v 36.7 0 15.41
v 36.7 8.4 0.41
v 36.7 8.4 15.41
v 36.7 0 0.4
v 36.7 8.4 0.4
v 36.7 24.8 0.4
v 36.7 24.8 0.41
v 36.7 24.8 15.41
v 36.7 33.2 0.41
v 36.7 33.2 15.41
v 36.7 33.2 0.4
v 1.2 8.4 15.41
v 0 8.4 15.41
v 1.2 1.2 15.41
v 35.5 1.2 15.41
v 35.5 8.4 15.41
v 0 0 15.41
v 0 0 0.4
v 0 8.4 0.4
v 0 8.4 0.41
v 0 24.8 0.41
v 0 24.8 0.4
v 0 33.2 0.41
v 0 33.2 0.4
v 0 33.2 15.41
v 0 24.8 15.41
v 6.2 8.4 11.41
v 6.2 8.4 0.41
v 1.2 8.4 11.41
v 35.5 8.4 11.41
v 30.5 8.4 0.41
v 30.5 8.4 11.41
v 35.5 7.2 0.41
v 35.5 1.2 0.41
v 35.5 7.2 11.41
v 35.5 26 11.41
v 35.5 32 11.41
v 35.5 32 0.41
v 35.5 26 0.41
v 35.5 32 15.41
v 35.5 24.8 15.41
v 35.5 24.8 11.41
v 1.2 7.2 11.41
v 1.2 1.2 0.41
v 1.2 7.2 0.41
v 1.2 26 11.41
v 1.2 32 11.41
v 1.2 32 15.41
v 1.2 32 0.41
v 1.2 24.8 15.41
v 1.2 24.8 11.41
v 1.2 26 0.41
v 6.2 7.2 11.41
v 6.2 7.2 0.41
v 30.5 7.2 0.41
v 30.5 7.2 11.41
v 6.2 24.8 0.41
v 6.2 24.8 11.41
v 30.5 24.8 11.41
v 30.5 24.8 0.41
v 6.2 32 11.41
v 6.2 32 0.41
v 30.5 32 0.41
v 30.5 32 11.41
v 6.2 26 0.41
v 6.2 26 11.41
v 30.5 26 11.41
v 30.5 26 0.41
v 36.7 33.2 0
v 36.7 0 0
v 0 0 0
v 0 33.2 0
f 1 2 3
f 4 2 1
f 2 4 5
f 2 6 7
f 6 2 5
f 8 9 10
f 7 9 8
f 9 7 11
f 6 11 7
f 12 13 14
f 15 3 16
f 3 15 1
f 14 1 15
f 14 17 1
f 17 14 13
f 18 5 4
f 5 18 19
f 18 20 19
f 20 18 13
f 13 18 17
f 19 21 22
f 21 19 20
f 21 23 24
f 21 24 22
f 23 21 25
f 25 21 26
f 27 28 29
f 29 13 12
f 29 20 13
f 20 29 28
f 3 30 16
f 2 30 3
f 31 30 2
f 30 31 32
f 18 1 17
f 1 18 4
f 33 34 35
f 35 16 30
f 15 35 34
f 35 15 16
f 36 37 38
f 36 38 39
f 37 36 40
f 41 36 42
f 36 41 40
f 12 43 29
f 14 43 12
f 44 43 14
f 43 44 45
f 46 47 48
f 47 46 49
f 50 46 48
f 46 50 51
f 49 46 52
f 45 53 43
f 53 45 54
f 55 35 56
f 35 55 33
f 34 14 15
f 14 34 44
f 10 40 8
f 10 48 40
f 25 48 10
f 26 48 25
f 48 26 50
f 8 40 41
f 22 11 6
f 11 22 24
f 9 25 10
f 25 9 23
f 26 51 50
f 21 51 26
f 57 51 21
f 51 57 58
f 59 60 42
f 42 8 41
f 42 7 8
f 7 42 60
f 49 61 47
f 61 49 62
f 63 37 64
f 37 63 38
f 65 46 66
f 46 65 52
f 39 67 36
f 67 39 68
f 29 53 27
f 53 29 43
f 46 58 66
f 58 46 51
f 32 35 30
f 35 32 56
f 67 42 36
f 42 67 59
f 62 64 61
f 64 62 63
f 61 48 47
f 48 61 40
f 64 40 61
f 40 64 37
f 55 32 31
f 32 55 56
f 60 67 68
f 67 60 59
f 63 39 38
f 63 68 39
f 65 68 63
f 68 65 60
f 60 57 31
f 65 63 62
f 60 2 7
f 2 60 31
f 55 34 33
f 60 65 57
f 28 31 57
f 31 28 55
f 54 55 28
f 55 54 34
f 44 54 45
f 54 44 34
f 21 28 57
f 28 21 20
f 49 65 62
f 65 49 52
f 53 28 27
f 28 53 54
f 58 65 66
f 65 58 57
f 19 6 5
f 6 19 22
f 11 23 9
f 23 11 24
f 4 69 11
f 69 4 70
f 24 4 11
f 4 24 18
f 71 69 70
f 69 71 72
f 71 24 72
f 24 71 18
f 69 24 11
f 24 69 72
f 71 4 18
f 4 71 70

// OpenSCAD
// file: ../../Base/Boxes.scad
// Fischertechnik Box Foundation
// Pre-designed Boxes

use <Constants.scad>

include <PlacementOptions.scad>

box190Width = 190;
box190Depth = 130;
box130Width = 130;
box130Depth = 95;
boxUsageHeight = 33.9;
boxWallThickness = 2.4;
boxBaseThickness = 1.0;
boxWebWidth = 3.0;

// getBoxWallThickness()
// Gets the wall thickness of a Fischertechnik Box

function getBoxWallThickness() = boxWallThickness;

// Gets the usable height of a fischertechnik box
function getBoxUsageHeight() = boxUsageHeight;

// Gets the thickness of the Fischertechnik box base.
function getBoxBaseThickness() = boxBaseThickness;

// Gets the width of a box web
function getBoxWebWidth() = boxWebWidth;

// Gets the usable inner space of a Box 190 as an x/y-list
function getBox190Space() = [
    box190Width - 2*getBoxWallThickness(), 
    box190Depth - 2*getBoxWallThickness() ];

// Imports the Fischertechnik empty box 130x190 mm and places it at position 0,0
// 190x130 are the outer sizes, the inner space is slightly smaller. Use getBox190Space() to get the inner sizes.
// This module needs the STL file "Fischertechnik Box 130x190.stl" in the library path.
// The box is positioned that the usable inner space is at the 0,0,0 position. The

module Box190() {
    translate([-getBoxWallThickness(),-getBoxWallThickness(),-getBoxBaseThickness()])
        import("Fischertechnik Box 130x190.stl", convexity=3);
}

// Gets the usable inner space of a Box 130 as an x/y-list
function getBox130Space() = [
    box130Width - 2*getBoxWallThickness(), 
    box130Depth - 2*getBoxWallThickness() ];

// Imports the Fischertechnik empty box 95x130 mm and places it at position 0,0
// 190x130 are the outer sizes, the inner space is slightly smaller. Use getBox190Space() to get the inner sizes.
// This module needs the STL file "Fischertechnik Box 95x130.stl" in the library path.
// The box is positioned that the usable inner space is at the 0,0,0 position. The

module Box130() {
    translate([-getBoxWallThickness(),-getBoxWallThickness(),-getBoxBaseThickness()])
        import("Fischertechnik Box 95x130.stl", convexity=3);
}

// Creates a web at the specified box walls
// corner 0 = LowerLeft, 1 = UpperLeft, 2 = UpperRight, 3 = LowerRight
// side 0 = LeftOfCorner, 1 = RightOfCorner
// distance = Distance in mm from the corner
// box = inner width and depth of the box (default: Box 190)
// webWidth = length of the web (default is 3 mms)
// webThickness = thickness of the web (default is 1 mm)

module BoxWeb(corner, side, distance, box=getBox190Space(), webWidth=getBoxWebWidth(), webThickness=1.0) {
    sink = getBoxWallThickness()/2;

    width = (corner % 2 == 0) ? 
            (side == LeftOfCorner ? webWidth : webThickness) :
            (side == LeftOfCorner ? webThickness : webWidth);

    depth = (corner % 2 == 0) ? 
            (side == RightOfCorner ? webWidth : webThickness) :
            (side == RightOfCorner ? webThickness : webWidth);
    
    xDiff = corner == LowerLeft ? 
                (side == LeftOfCorner ? -sink : distance) :
            (corner == UpperLeft ?                
                (side == LeftOfCorner ? distance : -sink) :
            (corner == UpperRight ?
                (side == LeftOfCorner ? box.x-webWidth+sink : box.x-distance-webThickness) :
                (side == LeftOfCorner ? box.x-distance-webThickness: box.x-webWidth+sink)));

    yDiff = corner == LowerLeft ? 
                (side == RightOfCorner ? -sink : distance) :
            (corner == UpperLeft ?
                (side == RightOfCorner ? box.y-distance : box.y-webWidth+sink) :
            (corner == UpperRight ?
                (side == RightOfCorner ? box.y-webWidth+sink : box.y-distance) :
                (side == RightOfCorner ? distance : -sink)));
    
    translate([xDiff, yDiff, -getExcess()])
        cube([width, depth, boxUsageHeight + 2*getExcess()]);
}
// file: ../../Base/Rotation.scad
// Fischertechnik Box Foundation
// Geometry Helpers Rotation

include <PlacementOptions.scad>

// getRotatedSpace(space, rotation=NoRotation)
// Rotates the space dependent on the specified rotation

function getRotatedSpace(space, rotation=NoRotation) = [
    (rotation == Rotate90 || rotation == Rotate270) ? space.y : space.x,
    (rotation == Rotate90 || rotation == Rotate270) ? space.x : space.y
];

// Rotates the given space around the fixed left lower corner
// space = the space the children needs as width/depth list [width,depth]
// rotation = 0 Rotate0 degrees, 1 Rotate90 degrees, 2 Rotate180 degrees, 3 Rotate270 degrees (equivalent to -90)

module RotateFix(space, rotation=Rotate0) {
    dy = (rotation == Rotate0 || rotation == Rotate270) ? 0 :
        (rotation == Rotate90) ? space.x :
        space.y;
    dx = (rotation < Rotate180) ? 0 :
        (rotation == Rotate180) ? space.x :
        space.y;
    
    translate([dx, dy, 0])
        rotate([0, 0, rotations[rotation]])
            children();
}
// file: ../../Base/Alignment.scad
// Fischertechnik Box Foundation
// Geometry Helpers Alignment

include <PlacementOptions.scad>

// getAlignedX(elementWidth, spaceWidth, align=AlignRight, offset=0)
// Gets the aligned X offset of an element with the given
// width in the given space.
// elementWidth = The width of the element to positon
// spaceWidth = The space where the element should be aligned
// align = 0 AlignLeft, 1 AlignCenter, 2 AlignRight
// offset = an optional offset from the aligned position. When
// aligned left or centered, then positive values are in X direction.
// When aligned right then positive values are in negative X direction.

function getAlignedX(elementWidth, spaceWidth, align=AlignRight, offset=0) =
    (align == AlignLeft) ?
        offset :
        ((align == AlignCenter) ?
        (spaceWidth - elementWidth)/2 + offset :
        spaceWidth - offset - elementWidth);

// getAlignedY(elementDepth, spaceDepth, align=AlignTop, offset=0)
// Gets the aligned Y offset of an element with the given
// depth in the given space.
// elementDepth = The depth of the element to positon
// spaceDepth = The space where the element should be aligned
// align = 0 AlignBottom, 1 AlignCenter, 2 AlignTop
// offset = an optional offset from the aligned position. When
// aligned bottom or centered, then positive values are in Y direction.
// When aligned top then positive values are in negative Y direction.

function getAlignedY(elementDepth, spaceDepth, align=AlignTop, offset=0) =
    (align == AlignBottom) ?
        offset :
        ((align == AlignCenter) ?
        (spaceDepth - elementDepth)/2 + offset :
        spaceDepth - offset - elementDepth);
// file: ../../Base/PlacementOptions.scad
// Fischertechnik Box Foundation
// Placement Options

// Alignment
NoAlign = 0;
AlignLeft = 1;
AlignBottom = 2;
AlignCenter = 3;
AlignRight = 4;
AlignTop = 5;

// Element rotation degree steps
rotations = [0, -90, -180, -270];

// Rotation
NoRotation = 0;
Rotate0 = 0;
Rotate90 = 1;
Rotate180 = 2;
Rotate270 = 3;

// Docking (seen from above)
NoDock = -1;
DockLeft = 0;
DockTop = 1;
DockRight = 2;
DockCorner = 2;
DockBottom = 3;

// Web corners
LowerLeft = 0;
UpperLeft = 1;
UpperRight = 2;
LowerRight = 3;

// Web position relative to corner
LeftOfCorner = 0;
RightOfCorner = 1;
// file: ../../Base/Placement.scad
// Fischertechnik Box Foundation
// Geometry Helpers Placement

use <Constants.scad>
use <Alignment.scad>
use <Rotation.scad>
use <Boxes.scad>

include <PlacementOptions.scad>

// Place(x=0, y=0, elementSpace=[0,0], alignX=AlignLeft, alignY=AlignBottom, rotation=Rotate0, boxSpace=getBox190Space())
// Places the child at the specified position
// y = Y-Position. This is a relative position when an X aligment is specified.
// x = X-Position. This is a relative position when an Y aligment is specified.
// elementSpace = space of the element to be placed [x,y]
// alignX = -1=NoAlign, 0 AlignLeft, 1 AlignCenter, 3 AlignRight (elementSpace and boxSpace required!)
// alignY = -1=NoAlign, 2 AlignBottom, 1 AlignCenter, 4 AlignTop (elementSpace and boxSpace required!)
// rotation = 0 Rotate0 0 degrees, 1 Rotate90 90 degrees, 
// 2 Rotate180 180 degrees, 3 Rotate270 270 degrees (equivalent to -90)
// boxSpace = Inner space of the box where the placement occurs [x,y] - default is Box 190x130 inner space

module Place(x=0, y=0, elementSpace=[0,0], 
  alignX=AlignLeft, alignY=AlignBottom, 
  rotation=NoRotation, boxSpace=getBox190Space()) {

    module Position(x, y, space, rotation=Rotate0) {
        translate([x, y, 0])
            RotateFix(space, rotation)
                children();
    }

    space = getRotatedSpace(elementSpace, rotation);
    alignedX = getAlignedX(space.x, boxSpace.x, alignX, x);
    alignedY = getAlignedY(space.y, boxSpace.y, alignY, y);
    Position(alignedX, alignedY, elementSpace, rotation)
        children();
}

// Center(space=getBox130Space(), elementSpace=[0,0])
// space = Space where the children is centered. For cylinder use centered=true and no elementSpace.
// elementSpace = space of the element to be centered [x,y]

module Center(space=getBox190Space(), elementSpace=[0,0]) {
    translate([(space.x - elementSpace.x) / 2, (space.y - elementSpace.y) / 2])
        children(0);
}

// CenterHorizontal(width=0, y=0, offset=0, space=getBox130Space())
// space = Space where the children is centered. For cylinder use centered=true and no elementSpace.
// elementSpace = space of the element to be centered [x,y]

module CenterHorizontal(width=0, y=0, offset=0, space=getBox190Space()) {
    translate([(space.x - width) / 2 + offset, y])
        children(0);
}

// CenterVertical(depth=0, x=0, offset=0, space=getBox130Space())
// space = Space where the children is centered. For cylinder use centered=true and no elementSpace.
// elementSpace = space of the element to be centered [x,y]

module CenterVertical(depth=0, x=0, offset=0, space=getBox190Space()) {
    translate([x, (space.y - depth) / 2 + offset])
        children(0);
}
// file: ../../Elements/AxisClip10.scad
// Fischertechnik Box Library
// Axis for clip 10
// 31023

use <../ModelBase/Simple.scad>

width = 12;
depth = 12;
height = 23;

// getAxisClip10Space()
// Gets the space of a frame for a clip 10 with spring ring (mot2)

function getAxisClip10Space() = [width, depth, height];

// AxisClip10()
// Axis for clip 10 with spring ring (mot2)

module AxisClip10() {
    LeveledAxisWithSpace(height, height-10, getAxisClip10Space());
}

// Tests
color("lightgray")
AxisClip10();
// file: ../../Base/Constants.scad
// Fischertechnik Box Foundation
// Constants

// Constant values necessary for multiple elements

// Base constants
dividerThickness = 1.2;
excess = 0.01;
fragments = 90;
tolerance = 0.8;

// Gets the thickness of a divider 
function getDividerThickness() = dividerThickness;

// Gets the excess that is used to merge walls into each other
function getExcess() = excess;

// Gets amount of fragments of a cylinder
function getFragments() = fragments;

// Gets the inner tolerance of a frame to each side
function getTolerance() = tolerance;


// Fischertechnik specific constants
axisDiameter = 4;
axisBottomDiameter = axisDiameter + 1;
standardEdgeDistance = 2.5;
standardWebDistance = 11.5;
standardCornerLength = 15;
tubeWallFactor = 0.8;

// Gets axis diameter
function getAxisDiameter() = axisDiameter;

// Gets axis bottom diameter for thicker part at the bottom
function getAxisBottomDiameter() = axisBottomDiameter;

// gets the standard distance to the wall of the box for dockable frames with webs
function getStandardEdgeDistance() = standardEdgeDistance;

// gets the standard distance of each web to the corner of the dockable frame
function getStandardWebDistance() = standardWebDistance;

// gets the standard length of the corner walls of a dockable frame
function getStandardCornerLength() = standardCornerLength;

// gets the wall thickness of a tube.
function getTubeWallThickness() = tubeWallFactor * getDividerThickness();
// file: ../../Elements/FrameAperture.scad
// Fischertechnik Box Library
// Frame for Pinhole, Slit Aperture, and Cross Aperture
// 31371, 31372, 31373 

use <../ModelBase/Simple.scad>
use <../ModelBase/Complex.scad>

width = 33.5;
depth = 30;
height = 11;

// getFrameApertureSpace()
// Gets the outer space the aperture frame needs.

function getFrameApertureSpace() = getFrameOuterVolume([width, depth, height]);

// FrameAperture()
// Frame for 30 mm flat slit or cross aperture.

module FrameAperture() {
    FrameSpecialFlat([width, depth, height]);
}

// Tests
color("lightgray") {
FrameAperture();
}
// file: ../TestPrint.scad
// 3D Print Test Base

use <../Base/Constants.scad>

use <../Elements/AxisClip10.scad>

module TestPrint(elementSpace) {
    cube([elementSpace.x, elementSpace.y, 0.4]);
    translate([0,0,0.4+getExcess()]) {
        children();
    }
}

TestPrint(getAxisClip10Space())
    AxisClip10();
// main file
// 3D Print Test
// FrameAperture

use <../TestPrint.scad>
use <../../Elements/FrameAperture.scad>

TestPrint(getFrameApertureSpace())
    FrameAperture();
